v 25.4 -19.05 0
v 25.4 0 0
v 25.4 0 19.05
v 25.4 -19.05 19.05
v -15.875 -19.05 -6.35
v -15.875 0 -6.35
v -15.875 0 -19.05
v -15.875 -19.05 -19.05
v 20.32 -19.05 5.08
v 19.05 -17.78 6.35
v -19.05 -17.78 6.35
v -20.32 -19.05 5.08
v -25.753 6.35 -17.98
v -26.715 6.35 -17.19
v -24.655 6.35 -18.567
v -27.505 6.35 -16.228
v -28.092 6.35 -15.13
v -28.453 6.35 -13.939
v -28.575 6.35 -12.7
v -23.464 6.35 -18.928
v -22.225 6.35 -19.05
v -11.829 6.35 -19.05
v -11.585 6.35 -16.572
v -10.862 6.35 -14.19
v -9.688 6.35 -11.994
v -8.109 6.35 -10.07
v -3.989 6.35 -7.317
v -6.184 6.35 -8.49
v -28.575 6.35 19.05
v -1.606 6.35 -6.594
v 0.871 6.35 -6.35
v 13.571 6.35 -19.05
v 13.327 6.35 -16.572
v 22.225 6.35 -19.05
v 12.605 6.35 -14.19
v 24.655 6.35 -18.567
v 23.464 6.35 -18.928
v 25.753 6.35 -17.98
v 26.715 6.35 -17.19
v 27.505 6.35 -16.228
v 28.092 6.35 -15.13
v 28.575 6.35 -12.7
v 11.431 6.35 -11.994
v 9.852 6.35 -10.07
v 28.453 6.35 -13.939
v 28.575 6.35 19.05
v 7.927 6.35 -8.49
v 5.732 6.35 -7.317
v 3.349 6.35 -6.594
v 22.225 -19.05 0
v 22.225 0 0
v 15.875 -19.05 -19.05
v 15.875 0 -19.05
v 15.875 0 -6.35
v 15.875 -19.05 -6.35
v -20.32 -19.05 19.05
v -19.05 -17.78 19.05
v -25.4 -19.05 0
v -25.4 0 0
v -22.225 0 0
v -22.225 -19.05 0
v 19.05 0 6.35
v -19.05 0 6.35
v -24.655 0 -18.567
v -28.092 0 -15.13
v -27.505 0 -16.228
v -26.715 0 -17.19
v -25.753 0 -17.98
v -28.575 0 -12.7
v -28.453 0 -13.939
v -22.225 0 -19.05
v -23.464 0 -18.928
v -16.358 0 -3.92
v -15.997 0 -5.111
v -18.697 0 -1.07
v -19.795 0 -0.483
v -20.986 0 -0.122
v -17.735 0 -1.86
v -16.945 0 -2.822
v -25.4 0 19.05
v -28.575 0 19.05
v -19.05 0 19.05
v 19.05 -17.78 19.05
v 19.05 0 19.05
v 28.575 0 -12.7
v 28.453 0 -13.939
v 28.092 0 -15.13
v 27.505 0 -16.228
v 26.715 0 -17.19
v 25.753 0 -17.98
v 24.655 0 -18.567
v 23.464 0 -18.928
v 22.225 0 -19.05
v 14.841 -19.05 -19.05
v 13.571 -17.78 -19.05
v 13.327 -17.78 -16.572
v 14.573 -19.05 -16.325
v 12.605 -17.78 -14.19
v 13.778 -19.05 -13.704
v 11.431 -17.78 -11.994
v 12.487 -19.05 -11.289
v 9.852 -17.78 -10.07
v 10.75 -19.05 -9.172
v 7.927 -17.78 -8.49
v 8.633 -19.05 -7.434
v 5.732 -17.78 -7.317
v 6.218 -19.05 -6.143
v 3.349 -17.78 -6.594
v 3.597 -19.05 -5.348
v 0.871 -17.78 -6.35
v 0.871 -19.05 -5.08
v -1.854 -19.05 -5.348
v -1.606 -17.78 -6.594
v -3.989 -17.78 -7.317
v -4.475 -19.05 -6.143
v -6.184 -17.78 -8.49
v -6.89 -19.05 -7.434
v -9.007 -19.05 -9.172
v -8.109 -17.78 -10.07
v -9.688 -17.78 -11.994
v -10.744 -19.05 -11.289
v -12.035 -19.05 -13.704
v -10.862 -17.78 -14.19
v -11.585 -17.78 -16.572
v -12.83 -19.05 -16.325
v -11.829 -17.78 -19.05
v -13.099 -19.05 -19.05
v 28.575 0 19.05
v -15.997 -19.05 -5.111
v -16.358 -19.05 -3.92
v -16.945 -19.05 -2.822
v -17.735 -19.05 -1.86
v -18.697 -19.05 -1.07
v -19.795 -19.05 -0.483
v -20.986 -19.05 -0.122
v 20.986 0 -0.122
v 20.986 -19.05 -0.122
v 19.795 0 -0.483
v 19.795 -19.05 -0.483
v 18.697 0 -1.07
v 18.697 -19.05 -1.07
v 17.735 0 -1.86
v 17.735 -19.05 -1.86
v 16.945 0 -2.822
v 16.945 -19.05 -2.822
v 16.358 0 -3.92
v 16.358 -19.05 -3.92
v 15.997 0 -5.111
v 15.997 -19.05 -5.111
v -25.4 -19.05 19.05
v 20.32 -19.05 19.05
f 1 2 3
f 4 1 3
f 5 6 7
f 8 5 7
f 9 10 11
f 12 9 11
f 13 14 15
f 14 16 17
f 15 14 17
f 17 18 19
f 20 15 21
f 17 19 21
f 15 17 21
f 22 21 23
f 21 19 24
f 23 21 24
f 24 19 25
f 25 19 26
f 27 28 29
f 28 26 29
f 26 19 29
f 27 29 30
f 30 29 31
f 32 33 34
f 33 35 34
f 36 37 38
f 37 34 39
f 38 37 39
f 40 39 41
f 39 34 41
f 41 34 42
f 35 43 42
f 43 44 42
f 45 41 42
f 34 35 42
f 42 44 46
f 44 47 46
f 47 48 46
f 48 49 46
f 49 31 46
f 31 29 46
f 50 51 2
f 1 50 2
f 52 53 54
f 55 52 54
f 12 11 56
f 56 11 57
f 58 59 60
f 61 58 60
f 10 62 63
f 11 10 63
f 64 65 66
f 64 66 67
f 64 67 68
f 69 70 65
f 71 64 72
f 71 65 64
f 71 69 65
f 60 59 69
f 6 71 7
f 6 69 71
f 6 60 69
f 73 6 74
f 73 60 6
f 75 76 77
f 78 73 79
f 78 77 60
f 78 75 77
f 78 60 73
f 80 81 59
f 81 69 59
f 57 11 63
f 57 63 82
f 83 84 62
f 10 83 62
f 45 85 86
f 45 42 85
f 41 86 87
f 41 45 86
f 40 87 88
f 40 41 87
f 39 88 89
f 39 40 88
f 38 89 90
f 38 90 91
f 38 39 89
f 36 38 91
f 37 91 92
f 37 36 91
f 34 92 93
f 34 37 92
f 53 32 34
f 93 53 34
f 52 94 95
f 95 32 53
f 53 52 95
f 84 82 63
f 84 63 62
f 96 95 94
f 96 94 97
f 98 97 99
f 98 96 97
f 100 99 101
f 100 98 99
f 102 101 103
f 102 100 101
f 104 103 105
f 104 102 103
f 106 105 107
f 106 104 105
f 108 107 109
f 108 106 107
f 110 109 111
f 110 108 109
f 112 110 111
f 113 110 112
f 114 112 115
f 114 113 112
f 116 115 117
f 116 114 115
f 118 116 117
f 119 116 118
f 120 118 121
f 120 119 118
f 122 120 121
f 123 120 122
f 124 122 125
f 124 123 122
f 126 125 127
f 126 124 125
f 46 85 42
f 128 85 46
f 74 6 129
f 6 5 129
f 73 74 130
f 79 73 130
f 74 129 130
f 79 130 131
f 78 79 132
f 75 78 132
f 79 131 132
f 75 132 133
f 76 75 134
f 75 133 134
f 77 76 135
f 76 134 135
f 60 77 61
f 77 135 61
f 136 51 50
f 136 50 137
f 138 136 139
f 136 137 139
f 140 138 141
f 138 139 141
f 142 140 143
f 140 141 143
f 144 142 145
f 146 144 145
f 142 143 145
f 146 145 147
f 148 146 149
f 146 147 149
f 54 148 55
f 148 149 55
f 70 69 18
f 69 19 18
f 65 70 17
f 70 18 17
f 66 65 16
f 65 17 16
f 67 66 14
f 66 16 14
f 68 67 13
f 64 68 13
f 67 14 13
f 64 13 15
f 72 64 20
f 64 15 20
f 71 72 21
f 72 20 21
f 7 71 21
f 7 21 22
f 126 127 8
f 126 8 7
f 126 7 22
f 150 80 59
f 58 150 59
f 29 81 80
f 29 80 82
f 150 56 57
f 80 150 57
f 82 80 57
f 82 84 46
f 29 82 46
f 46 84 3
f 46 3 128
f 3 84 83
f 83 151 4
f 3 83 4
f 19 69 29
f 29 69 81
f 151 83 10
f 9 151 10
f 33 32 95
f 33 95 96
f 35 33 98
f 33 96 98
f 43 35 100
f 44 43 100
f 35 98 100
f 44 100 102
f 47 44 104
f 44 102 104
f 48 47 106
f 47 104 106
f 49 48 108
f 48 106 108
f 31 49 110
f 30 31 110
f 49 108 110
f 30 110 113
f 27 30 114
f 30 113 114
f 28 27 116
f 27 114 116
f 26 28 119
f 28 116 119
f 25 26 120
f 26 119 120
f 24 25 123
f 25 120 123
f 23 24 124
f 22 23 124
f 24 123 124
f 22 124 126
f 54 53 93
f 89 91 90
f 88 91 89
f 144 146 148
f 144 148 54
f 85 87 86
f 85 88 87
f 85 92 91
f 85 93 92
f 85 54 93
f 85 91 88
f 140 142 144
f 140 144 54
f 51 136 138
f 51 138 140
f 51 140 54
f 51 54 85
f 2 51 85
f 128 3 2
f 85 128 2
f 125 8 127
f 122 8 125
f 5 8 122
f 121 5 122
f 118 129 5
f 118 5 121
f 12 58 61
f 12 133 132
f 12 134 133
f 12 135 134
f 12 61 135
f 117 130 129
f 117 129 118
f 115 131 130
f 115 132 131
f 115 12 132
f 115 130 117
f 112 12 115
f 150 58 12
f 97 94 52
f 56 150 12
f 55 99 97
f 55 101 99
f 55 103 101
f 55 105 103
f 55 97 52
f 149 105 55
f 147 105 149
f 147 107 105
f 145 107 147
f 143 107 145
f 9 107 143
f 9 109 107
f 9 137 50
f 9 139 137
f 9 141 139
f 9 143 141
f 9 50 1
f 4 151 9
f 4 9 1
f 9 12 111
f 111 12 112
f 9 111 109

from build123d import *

# Parameters (mm, degrees)
F0_W     = 57.15
F0_H     = 38.1
F1_DEPTH = 6.35
F3_DEPTH = 19.05
F5_DEPTH = 25.401
F6_R     = 6.35
F7_SIZE  = 1.27


with BuildPart() as f1:
    # F0 (on Front) → F1 (new body)
    with BuildSketch(Plane.XZ):
        Rectangle(F0_W, F0_H)
    extrude(amount=-F1_DEPTH)

    # F2 (on face) → F3 (join)
    with BuildSketch(Plane.XZ):
        Polygon((-19.05, 19.05), (-25.4, 19.05), (-25.4, 0), (-15.875, 0), (-15.875, -19.05), (15.875, -19.05), (15.875, 0), (25.4, 0), (25.4, 19.05), (19.05, 19.05), (19.05, 6.35), (-19.05, 6.35), align=None)
    extrude(amount=F3_DEPTH)

    # F4 (on face) → F5 (cut, through all)
    with BuildSketch(Plane.XZ.offset(19.05)):
        with BuildLine():
            Line((-11.828537, -19.05), (13.571463, -19.05))
            ThreePointArc((13.571463, -19.05), (0.871463, -6.35), (-11.828537, -19.05))
        make_face()
    extrude(amount=-F5_DEPTH, mode=Mode.SUBTRACT)

    # F6
    f6_edges = [f1.edges().sort_by_distance(p)[0] for p in [
        (-28.575, 3.175, -19.05),
        (28.575, 3.175, -19.05),
        (15.875, -9.525, 0),
        (-15.875, -9.525, 0),
    ]]
    fillet(f6_edges, radius=F6_R)

    # F7
    f7_edges = [f1.edges().sort_by_distance(p)[0] for p in [
        (0.871463, -19.05, -6.35),
        (0, -19.05, 6.35),
        (-19.05, -19.05, 12.7),
        (19.05, -19.05, 12.7),
    ]]
    chamfer(f7_edges, length=F7_SIZE)


solid = f1.part
